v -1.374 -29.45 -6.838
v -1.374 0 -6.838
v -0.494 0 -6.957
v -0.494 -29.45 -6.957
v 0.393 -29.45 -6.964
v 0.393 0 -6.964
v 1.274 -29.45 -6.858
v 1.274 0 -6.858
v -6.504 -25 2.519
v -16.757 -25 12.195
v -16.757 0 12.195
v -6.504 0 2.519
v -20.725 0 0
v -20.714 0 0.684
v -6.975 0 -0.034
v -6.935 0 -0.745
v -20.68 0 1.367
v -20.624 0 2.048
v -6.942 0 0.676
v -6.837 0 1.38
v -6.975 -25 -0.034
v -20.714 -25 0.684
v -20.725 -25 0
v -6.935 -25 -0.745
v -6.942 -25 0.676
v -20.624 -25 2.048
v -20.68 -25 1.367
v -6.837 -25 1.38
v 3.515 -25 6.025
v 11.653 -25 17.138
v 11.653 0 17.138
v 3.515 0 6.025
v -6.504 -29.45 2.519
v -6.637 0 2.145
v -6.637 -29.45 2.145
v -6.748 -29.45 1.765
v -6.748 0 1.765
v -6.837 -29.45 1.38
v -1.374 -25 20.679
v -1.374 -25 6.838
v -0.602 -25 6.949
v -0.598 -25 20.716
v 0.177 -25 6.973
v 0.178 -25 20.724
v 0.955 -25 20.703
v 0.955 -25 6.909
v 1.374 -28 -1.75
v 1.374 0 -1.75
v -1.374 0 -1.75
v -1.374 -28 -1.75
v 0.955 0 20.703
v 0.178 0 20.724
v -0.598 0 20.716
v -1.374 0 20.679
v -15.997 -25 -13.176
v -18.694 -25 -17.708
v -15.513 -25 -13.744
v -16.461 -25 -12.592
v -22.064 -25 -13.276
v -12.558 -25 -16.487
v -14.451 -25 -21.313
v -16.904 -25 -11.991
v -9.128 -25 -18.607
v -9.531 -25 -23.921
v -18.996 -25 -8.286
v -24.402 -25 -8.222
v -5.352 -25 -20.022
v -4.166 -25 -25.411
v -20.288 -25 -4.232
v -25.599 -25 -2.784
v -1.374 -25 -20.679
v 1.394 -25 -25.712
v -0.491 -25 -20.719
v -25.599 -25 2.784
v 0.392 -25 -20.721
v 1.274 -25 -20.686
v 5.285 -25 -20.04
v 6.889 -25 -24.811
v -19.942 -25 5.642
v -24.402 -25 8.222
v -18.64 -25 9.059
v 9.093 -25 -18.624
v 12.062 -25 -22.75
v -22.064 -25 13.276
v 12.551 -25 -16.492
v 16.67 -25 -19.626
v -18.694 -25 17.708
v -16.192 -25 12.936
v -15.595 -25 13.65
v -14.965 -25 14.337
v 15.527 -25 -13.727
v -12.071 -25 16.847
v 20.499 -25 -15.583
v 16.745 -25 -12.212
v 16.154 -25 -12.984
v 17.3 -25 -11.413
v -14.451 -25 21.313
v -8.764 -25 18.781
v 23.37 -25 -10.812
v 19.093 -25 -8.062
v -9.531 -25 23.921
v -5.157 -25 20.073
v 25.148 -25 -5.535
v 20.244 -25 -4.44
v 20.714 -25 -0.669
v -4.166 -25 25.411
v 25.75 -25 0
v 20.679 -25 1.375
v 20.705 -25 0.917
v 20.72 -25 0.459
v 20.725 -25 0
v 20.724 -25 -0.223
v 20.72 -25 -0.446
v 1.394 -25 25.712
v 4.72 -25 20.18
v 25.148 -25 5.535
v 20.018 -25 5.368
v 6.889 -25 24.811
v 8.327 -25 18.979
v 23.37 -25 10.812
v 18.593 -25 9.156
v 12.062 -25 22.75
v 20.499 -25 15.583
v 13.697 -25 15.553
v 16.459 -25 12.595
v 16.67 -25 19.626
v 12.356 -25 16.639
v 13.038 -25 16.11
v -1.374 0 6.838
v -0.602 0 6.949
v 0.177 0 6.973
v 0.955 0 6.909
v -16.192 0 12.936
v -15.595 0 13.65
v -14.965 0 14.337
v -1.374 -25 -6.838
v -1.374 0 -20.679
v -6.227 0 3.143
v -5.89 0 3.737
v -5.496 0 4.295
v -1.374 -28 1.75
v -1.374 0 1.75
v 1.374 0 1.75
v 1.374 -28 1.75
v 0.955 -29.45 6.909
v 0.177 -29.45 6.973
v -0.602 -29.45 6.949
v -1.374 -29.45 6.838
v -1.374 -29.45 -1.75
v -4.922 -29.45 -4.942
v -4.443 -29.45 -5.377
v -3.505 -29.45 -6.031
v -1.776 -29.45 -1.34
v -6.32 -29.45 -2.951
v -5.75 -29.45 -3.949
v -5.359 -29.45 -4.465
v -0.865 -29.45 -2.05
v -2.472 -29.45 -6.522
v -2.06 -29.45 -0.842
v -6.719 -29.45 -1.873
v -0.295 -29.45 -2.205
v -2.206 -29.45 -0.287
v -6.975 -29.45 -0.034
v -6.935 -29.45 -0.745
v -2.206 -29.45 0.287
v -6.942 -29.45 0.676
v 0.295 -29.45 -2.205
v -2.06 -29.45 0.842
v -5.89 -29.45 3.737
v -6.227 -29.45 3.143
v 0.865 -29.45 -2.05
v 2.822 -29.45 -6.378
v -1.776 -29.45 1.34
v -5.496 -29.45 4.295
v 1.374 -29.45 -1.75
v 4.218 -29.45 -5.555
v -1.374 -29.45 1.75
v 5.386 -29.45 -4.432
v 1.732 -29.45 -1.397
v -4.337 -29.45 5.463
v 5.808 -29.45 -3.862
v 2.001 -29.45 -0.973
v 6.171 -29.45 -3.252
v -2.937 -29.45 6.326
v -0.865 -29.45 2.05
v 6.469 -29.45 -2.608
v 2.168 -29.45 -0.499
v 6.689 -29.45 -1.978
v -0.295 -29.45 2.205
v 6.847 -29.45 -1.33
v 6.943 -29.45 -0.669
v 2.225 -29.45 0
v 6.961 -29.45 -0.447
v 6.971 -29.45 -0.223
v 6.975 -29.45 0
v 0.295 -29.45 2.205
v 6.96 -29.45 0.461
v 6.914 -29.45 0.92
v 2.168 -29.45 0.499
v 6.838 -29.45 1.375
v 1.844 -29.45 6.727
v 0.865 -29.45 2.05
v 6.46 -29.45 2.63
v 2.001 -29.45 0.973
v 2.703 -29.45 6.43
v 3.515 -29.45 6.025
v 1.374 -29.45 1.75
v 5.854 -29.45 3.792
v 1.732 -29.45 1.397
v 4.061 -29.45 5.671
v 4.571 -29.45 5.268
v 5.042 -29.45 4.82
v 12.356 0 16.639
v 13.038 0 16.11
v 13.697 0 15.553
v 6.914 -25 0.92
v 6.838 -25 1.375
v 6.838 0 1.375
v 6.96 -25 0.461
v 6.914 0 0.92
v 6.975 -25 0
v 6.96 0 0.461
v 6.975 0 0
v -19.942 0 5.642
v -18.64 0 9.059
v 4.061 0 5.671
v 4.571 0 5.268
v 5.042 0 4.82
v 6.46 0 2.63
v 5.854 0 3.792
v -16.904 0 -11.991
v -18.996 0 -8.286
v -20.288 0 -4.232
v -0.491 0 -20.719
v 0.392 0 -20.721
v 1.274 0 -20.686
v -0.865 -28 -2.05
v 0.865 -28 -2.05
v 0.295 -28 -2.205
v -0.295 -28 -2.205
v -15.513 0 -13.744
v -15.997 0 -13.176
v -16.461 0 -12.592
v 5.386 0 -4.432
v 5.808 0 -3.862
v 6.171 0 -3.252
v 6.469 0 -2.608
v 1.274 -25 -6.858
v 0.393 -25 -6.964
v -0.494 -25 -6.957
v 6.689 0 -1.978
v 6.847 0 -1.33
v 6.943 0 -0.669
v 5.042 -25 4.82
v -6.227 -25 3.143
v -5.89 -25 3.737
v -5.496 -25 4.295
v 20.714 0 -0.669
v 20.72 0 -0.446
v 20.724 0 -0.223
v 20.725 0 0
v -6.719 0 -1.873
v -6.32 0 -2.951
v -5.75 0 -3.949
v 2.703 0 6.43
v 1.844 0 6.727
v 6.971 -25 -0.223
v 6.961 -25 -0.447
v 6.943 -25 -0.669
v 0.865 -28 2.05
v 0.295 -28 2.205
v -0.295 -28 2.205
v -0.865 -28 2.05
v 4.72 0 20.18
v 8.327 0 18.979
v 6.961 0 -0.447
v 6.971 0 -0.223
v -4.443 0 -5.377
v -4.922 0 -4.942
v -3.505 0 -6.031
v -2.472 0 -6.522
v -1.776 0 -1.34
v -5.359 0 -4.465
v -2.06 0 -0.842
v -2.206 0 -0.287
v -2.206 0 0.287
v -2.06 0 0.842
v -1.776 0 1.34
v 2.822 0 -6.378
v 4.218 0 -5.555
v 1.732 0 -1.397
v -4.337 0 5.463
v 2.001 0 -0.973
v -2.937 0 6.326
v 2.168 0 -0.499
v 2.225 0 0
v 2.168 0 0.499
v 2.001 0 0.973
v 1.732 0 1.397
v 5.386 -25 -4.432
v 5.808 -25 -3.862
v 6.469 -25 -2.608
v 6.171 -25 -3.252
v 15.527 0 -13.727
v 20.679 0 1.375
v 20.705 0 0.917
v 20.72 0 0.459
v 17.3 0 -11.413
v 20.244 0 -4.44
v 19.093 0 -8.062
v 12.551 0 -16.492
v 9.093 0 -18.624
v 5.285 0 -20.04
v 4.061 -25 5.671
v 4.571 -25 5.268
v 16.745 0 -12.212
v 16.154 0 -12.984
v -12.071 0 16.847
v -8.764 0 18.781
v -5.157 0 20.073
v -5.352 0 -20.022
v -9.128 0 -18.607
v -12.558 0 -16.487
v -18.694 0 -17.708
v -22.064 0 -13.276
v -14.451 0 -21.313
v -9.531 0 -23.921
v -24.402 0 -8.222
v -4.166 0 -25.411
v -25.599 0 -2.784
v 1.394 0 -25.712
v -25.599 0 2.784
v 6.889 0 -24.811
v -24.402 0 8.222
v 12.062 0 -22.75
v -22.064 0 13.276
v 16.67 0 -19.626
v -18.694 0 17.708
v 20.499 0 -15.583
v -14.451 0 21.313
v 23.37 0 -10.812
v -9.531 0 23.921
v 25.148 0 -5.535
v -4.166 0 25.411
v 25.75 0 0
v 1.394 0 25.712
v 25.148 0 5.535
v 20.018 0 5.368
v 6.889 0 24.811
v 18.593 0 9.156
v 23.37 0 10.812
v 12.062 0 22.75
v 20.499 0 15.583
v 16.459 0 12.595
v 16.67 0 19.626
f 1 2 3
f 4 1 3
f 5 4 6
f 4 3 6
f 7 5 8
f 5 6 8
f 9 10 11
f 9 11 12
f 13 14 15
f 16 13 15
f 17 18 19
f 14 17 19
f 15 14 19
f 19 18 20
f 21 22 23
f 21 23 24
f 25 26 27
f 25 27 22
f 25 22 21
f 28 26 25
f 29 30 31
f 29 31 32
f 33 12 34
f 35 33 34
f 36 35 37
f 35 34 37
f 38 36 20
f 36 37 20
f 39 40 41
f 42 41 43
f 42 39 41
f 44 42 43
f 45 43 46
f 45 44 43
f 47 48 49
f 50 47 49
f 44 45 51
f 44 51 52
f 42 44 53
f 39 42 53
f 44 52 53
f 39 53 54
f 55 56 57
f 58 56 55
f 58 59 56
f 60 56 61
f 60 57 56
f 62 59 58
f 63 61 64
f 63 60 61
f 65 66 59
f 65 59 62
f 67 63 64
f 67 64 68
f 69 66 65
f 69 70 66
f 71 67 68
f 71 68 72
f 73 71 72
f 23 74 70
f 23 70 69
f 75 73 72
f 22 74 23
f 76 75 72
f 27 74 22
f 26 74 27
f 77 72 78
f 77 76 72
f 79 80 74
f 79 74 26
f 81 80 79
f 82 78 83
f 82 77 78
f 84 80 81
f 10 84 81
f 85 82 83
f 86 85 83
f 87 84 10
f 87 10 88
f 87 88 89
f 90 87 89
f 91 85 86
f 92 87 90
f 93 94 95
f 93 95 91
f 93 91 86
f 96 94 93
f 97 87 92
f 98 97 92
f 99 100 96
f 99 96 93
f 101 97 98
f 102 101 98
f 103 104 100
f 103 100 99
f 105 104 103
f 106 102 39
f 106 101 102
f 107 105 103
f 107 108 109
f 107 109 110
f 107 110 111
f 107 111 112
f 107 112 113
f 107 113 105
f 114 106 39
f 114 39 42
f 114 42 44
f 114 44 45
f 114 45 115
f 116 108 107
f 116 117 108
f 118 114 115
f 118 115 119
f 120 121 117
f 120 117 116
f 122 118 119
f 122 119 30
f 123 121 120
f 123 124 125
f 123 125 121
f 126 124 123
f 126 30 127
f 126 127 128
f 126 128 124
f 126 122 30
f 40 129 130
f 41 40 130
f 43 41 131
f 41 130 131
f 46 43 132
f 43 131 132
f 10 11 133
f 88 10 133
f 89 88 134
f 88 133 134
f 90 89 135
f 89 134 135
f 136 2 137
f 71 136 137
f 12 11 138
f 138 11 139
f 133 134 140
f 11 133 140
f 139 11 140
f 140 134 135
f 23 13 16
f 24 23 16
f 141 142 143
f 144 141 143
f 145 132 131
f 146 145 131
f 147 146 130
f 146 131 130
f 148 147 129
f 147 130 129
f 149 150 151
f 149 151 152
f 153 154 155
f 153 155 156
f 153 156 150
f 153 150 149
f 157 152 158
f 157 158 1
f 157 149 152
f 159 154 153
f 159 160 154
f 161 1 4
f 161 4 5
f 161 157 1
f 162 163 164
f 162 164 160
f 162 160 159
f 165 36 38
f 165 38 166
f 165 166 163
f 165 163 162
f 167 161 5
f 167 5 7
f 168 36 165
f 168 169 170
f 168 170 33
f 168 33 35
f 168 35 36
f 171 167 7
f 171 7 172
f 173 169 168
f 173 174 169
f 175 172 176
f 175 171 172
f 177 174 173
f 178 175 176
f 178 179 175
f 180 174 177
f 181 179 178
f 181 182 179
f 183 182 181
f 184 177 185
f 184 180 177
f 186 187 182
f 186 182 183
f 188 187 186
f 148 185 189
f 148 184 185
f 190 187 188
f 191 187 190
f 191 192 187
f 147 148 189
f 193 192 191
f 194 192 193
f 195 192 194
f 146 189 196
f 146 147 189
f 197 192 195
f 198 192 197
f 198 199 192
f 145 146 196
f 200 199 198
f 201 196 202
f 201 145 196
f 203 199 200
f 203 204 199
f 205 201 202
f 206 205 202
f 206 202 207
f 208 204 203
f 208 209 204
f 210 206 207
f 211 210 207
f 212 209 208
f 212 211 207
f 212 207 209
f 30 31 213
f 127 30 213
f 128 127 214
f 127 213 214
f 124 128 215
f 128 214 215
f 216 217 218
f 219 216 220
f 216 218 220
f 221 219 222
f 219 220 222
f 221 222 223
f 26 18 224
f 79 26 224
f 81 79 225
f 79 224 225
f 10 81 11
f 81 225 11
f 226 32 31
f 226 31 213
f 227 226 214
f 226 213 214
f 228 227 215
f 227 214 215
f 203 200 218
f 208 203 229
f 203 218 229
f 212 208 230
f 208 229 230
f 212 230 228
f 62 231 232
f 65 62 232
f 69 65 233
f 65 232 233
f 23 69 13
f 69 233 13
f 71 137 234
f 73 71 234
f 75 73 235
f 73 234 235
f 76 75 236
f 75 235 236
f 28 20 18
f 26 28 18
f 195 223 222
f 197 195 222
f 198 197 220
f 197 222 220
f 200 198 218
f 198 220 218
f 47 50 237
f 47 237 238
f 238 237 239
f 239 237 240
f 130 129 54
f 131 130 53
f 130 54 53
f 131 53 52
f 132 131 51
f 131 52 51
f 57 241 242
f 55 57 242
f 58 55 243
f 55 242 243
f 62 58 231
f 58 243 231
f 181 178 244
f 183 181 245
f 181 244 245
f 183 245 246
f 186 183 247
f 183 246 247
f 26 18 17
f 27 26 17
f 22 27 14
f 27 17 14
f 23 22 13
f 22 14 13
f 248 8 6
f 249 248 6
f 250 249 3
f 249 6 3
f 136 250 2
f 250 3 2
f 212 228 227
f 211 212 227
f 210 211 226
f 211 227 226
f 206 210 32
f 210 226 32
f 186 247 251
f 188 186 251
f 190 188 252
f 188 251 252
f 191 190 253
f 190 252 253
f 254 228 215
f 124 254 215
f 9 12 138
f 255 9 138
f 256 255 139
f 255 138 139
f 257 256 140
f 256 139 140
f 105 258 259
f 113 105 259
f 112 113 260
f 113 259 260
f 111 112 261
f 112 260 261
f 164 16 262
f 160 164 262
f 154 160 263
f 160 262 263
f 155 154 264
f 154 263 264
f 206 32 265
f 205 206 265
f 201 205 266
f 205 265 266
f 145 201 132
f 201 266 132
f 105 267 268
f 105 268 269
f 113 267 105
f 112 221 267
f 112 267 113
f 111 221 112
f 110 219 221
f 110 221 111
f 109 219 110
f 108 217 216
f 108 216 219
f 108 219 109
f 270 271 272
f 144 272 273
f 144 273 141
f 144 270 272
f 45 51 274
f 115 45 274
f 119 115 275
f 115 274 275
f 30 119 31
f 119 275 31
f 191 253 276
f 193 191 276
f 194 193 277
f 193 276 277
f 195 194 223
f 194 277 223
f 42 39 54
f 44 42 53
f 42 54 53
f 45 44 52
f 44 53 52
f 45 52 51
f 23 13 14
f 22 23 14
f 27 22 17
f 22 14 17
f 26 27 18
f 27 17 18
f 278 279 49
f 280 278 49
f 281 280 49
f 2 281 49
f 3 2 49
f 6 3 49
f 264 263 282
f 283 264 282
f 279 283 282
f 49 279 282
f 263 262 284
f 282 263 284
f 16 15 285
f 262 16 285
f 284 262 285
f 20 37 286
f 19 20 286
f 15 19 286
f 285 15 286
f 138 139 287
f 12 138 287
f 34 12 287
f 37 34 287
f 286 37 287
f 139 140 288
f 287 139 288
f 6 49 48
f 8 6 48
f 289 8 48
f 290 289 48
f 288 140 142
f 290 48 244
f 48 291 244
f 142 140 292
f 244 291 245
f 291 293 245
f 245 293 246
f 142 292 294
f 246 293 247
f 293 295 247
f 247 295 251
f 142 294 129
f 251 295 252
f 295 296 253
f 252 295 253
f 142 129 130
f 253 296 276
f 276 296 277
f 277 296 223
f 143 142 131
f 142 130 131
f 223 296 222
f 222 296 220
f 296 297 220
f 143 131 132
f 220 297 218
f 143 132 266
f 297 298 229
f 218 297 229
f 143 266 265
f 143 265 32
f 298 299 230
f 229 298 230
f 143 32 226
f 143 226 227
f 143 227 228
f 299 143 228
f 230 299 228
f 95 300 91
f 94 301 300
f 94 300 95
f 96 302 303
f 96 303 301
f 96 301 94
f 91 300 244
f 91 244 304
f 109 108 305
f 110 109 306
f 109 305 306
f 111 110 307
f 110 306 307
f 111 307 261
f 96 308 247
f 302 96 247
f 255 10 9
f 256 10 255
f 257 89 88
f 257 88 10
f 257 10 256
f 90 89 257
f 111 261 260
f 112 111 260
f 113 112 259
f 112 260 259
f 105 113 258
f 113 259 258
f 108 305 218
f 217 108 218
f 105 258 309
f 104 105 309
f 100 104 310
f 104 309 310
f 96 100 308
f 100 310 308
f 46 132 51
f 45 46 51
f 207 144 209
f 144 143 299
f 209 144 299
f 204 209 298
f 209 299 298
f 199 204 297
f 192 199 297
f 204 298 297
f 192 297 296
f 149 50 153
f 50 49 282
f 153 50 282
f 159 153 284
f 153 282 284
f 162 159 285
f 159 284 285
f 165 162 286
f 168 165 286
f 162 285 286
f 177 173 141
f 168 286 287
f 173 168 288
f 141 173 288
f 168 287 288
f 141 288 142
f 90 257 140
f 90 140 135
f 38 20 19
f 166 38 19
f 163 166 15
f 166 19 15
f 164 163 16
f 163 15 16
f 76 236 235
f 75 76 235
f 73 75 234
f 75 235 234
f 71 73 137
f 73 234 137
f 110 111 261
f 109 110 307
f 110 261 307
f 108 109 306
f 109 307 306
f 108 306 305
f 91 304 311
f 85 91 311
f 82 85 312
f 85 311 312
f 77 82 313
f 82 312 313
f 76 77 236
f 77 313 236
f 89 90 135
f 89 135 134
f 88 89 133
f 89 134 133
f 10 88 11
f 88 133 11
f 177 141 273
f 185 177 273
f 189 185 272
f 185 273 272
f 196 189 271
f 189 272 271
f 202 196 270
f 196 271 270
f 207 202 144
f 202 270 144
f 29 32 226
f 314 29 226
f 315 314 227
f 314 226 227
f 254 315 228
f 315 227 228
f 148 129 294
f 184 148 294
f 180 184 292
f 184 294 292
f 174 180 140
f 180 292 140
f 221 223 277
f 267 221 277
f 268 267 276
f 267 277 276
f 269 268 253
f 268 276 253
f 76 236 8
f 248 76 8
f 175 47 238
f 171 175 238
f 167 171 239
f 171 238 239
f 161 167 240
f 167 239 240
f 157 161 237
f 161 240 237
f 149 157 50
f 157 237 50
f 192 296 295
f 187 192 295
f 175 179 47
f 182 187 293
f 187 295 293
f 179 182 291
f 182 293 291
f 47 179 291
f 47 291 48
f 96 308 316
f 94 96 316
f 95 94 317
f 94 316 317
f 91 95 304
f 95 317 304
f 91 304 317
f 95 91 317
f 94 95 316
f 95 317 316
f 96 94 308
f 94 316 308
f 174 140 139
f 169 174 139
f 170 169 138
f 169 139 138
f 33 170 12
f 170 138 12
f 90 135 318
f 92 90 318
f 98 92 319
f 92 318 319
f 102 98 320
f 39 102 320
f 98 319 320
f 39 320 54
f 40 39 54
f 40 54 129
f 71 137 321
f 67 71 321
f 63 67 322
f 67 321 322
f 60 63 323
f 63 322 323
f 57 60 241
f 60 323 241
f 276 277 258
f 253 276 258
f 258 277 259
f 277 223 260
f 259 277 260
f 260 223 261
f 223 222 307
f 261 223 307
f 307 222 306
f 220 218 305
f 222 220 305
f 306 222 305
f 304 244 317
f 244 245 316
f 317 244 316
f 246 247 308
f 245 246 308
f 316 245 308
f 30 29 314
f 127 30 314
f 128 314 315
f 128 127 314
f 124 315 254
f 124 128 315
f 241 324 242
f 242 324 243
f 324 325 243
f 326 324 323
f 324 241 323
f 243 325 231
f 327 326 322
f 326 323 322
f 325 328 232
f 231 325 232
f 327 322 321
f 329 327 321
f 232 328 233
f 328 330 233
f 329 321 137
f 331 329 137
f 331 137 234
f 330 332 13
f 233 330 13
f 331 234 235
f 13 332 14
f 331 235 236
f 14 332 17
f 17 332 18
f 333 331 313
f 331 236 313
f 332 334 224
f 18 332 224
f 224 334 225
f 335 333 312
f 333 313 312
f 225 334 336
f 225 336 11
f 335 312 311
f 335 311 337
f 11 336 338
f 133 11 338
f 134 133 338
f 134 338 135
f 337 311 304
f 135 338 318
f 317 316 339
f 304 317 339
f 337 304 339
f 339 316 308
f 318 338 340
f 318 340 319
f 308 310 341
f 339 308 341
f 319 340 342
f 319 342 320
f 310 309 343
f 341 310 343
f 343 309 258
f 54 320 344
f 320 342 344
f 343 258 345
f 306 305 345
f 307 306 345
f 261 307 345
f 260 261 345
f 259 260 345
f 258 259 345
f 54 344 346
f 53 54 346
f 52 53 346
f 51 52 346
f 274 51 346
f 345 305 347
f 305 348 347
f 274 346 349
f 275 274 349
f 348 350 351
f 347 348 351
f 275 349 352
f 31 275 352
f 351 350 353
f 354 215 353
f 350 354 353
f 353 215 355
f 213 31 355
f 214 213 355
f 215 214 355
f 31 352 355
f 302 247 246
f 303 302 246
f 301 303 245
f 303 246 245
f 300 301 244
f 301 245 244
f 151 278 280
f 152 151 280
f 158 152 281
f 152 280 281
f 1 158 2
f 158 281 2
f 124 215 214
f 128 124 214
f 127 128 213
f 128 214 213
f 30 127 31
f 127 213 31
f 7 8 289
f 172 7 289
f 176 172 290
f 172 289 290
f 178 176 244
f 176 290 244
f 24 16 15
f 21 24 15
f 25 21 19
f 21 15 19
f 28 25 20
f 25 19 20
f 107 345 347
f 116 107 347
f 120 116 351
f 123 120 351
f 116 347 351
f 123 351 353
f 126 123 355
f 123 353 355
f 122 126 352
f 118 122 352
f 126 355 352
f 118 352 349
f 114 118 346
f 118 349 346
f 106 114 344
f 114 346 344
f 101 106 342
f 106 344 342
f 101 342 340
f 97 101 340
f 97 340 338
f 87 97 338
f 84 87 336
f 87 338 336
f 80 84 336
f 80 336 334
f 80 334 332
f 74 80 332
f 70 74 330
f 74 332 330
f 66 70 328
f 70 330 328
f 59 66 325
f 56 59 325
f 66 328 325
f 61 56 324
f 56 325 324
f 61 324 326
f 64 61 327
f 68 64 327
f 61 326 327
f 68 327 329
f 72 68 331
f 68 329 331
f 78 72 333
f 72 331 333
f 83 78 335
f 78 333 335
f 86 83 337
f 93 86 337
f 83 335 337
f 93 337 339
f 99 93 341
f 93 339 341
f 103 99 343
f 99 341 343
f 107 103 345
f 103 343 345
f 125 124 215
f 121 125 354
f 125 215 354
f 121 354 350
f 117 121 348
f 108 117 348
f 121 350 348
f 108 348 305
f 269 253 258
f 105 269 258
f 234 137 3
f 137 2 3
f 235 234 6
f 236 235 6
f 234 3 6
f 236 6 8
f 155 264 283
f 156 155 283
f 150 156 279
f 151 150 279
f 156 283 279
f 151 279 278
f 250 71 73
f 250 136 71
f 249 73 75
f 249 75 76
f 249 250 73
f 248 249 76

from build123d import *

# Parameters (mm, degrees)
F0_R     = 25.75
F1_DEPTH = 25
F2_DEPTH = 29.45
F3_DEPTH = 28
F4_DEPTH = 25


with BuildPart() as f1:
    # F0 (on Front) → F1 (new body)
    with BuildSketch(Plane.XZ):
        Circle(F0_R)
        with BuildLine():
            ThreePointArc((20.679312, 1.375379), (20.713575, 0.688069), (20.725, 0))
            ThreePointArc((20.725, 0), (20.722297, -0.334688), (20.71419, -0.669289))
            ThreePointArc((20.71419, -0.669289), (19.751408, -6.277539), (17.299683, -11.412563))
            ThreePointArc((17.299683, -11.412563), (16.454074, -12.601154), (15.526954, -13.727321))
            ThreePointArc((15.526954, -13.727321), (9.092691, -18.623871), (1.274476, -20.685776))
            ThreePointArc((1.274476, -20.685776), (-0.049745, -20.72494), (-1.373763, -20.67942))
            ThreePointArc((-1.373763, -20.67942), (-9.127585, -18.606795), (-15.51251, -13.74364))
            ThreePointArc((-15.51251, -13.74364), (-16.231848, -12.886145), (-16.903845, -11.991066))
            ThreePointArc((-16.903845, -11.991066), (-19.746617, -6.292593), (-20.725, 0))
            ThreePointArc((-20.725, 0), (-20.699616, 1.025436), (-20.623527, 2.048359))
            ThreePointArc((-20.623527, 2.048359), (-19.366726, 7.3794), (-16.757287, 12.195038))
            ThreePointArc((-16.757287, 12.195038), (-15.897486, 13.296449), (-14.965425, 14.337422))
            ThreePointArc((-14.965425, 14.337422), (-8.763567, 18.780988), (-1.374091, 20.679398))
            ThreePointArc((-1.374091, 20.679398), (-0.20997, 20.723936), (0.954814, 20.702994))
            ThreePointArc((0.954814, 20.702994), (6.551124, 19.66236), (11.653244, 17.138481))
            ThreePointArc((11.653244, 17.138481), (12.700102, 16.377822), (13.697447, 15.553313))
            ThreePointArc((13.697447, 15.553313), (18.592844, 9.155969), (20.679312, 1.375379))
        make_face(mode=Mode.SUBTRACT)
    extrude(amount=F1_DEPTH)


with BuildPart() as f2:
    # F0 (on Front) → F2 (new body)
    with BuildSketch(Plane.XZ):
        with BuildLine():
            ThreePointArc((6.975, 0), (6.940679, 0.69109), (6.838052, 1.375379))
            ThreePointArc((6.838052, 1.375379), (6.184484, 3.225335), (5.041566, 4.820086))
            ThreePointArc((5.041566, 4.820086), (4.320488, 5.475766), (3.515055, 6.024534))
            ThreePointArc((3.515055, 6.024534), (2.2783, 6.592418), (0.954814, 6.909338))
            ThreePointArc((0.954814, 6.909338), (-0.212625, 6.971758), (-1.374091, 6.838311))
            ThreePointArc((-1.374091, 6.838311), (-3.662813, 5.935859), (-5.495842, 4.294921))
            ThreePointArc((-5.495842, 4.294921), (-6.065514, 3.443859), (-6.504423, 2.518552))
            ThreePointArc((-6.504423, 2.518552), (-6.695044, 1.956274), (-6.837157, 1.379821))
            ThreePointArc((-6.837157, 1.379821), (-6.967596, 0.321289), (-6.935126, -0.744754))
            ThreePointArc((-6.935126, -0.744754), (-6.54156, -2.420457), (-5.749608, -3.948751))
            ThreePointArc((-5.749608, -3.948751), (-5.145982, -4.708449), (-4.44277, -5.377027))
            ThreePointArc((-4.44277, -5.377027), (-2.99865, -6.297517), (-1.373763, -6.838377))
            ThreePointArc((-1.373763, -6.838377), (-0.050563, -6.974817), (1.274476, -6.857575))
            ThreePointArc((1.274476, -6.857575), (3.544137, -6.007472), (5.385882, -4.432031))
            ThreePointArc((5.385882, -4.432031), (5.997274, -3.561366), (6.469139, -2.607846))
            ThreePointArc((6.469139, -2.607846), (6.775664, -1.655595), (6.942815, -0.669289))
            ThreePointArc((6.942815, -0.669289), (6.966949, -0.335031), (6.975, 0))
        make_face()
        with BuildLine():
            ThreePointArc((1.374091, 1.75), (2.000997, 0.972953), (2.225, 0))
            ThreePointArc((2.225, 0), (2.000997, -0.972953), (1.374091, -1.75))
            ThreePointArc((1.374091, -1.75), (0, -2.225), (-1.374091, -1.75))
            ThreePointArc((-1.374091, -1.75), (-2.225, 0), (-1.374091, 1.75))
            ThreePointArc((-1.374091, 1.75), (0, 2.225), (1.374091, 1.75))
        make_face(mode=Mode.SUBTRACT)
    extrude(amount=F2_DEPTH)

    # F0 (on Front) → F3 (join)
    with BuildSketch(Plane.XZ):
        with BuildLine():
            Line((-1.374091, 1.75), (1.374091, 1.75))
            ThreePointArc((1.374091, 1.75), (0, 2.225), (-1.374091, 1.75))
        make_face()
        with BuildLine():
            ThreePointArc((-1.374091, -1.75), (0, -2.225), (1.374091, -1.75))
            Line((1.374091, -1.75), (-1.374091, -1.75))
        make_face()
    extrude(amount=F3_DEPTH)


with BuildPart() as f4:
    # F0 (on Front) → F4 (new body)
    with BuildSketch(Plane.XZ):
        with BuildLine():
            Line((-5.495842, 4.294921), (-14.965425, 14.337422))
            ThreePointArc((-14.965425, 14.337422), (-15.897486, 13.296449), (-16.757287, 12.195038))
            Line((-16.757287, 12.195038), (-6.504423, 2.518552))
            ThreePointArc((-6.504423, 2.518552), (-6.065514, 3.443859), (-5.495842, 4.294921))
        make_face()
        with BuildLine():
            Line((0.954814, 6.909338), (0.954814, 20.702994))
            ThreePointArc((0.954814, 20.702994), (-0.20997, 20.723936), (-1.374091, 20.679398))
            Line((-1.374091, 20.679398), (-1.374091, 6.838311))
            ThreePointArc((-1.374091, 6.838311), (-0.212625, 6.971758), (0.954814, 6.909338))
        make_face()
        with BuildLine():
            Line((5.041566, 4.820086), (13.697447, 15.553313))
            ThreePointArc((13.697447, 15.553313), (12.700102, 16.377822), (11.653244, 17.138481))
            Line((11.653244, 17.138481), (3.515055, 6.024534))
            ThreePointArc((3.515055, 6.024534), (4.320488, 5.475766), (5.041566, 4.820086))
        make_face()
        with BuildLine():
            ThreePointArc((20.71419, -0.669289), (20.722297, -0.334688), (20.725, 0))
            ThreePointArc((20.725, 0), (20.713575, 0.688069), (20.679312, 1.375379))
            Line((20.679312, 1.375379), (6.838052, 1.375379))
            ThreePointArc((6.838052, 1.375379), (6.940679, 0.69109), (6.975, 0))
            ThreePointArc((6.975, 0), (6.966949, -0.335031), (6.942815, -0.669289))
            Line((6.942815, -0.669289), (20.71419, -0.669289))
        make_face()
        with BuildLine():
            ThreePointArc((15.526954, -13.727321), (16.454074, -12.601154), (17.299683, -11.412563))
            Line((17.299683, -11.412563), (6.469139, -2.607846))
            ThreePointArc((6.469139, -2.607846), (5.997274, -3.561366), (5.385882, -4.432031))
            Line((5.385882, -4.432031), (15.526954, -13.727321))
        make_face()
        with BuildLine():
            Line((-6.837157, 1.379821), (-20.623527, 2.048359))
            ThreePointArc((-20.623527, 2.048359), (-20.699616, 1.025436), (-20.725, 0))
            Line((-20.725, 0), (-6.935126, -0.744754))
            ThreePointArc((-6.935126, -0.744754), (-6.967596, 0.321289), (-6.837157, 1.379821))
        make_face()
        with BuildLine():
            ThreePointArc((-1.373763, -20.67942), (-0.049745, -20.72494), (1.274476, -20.685776))
            Line((1.274476, -20.685776), (1.274476, -6.857575))
            ThreePointArc((1.274476, -6.857575), (-0.050563, -6.974817), (-1.373763, -6.838377))
            Line((-1.373763, -6.838377), (-1.373763, -20.67942))
        make_face()
    extrude(amount=F4_DEPTH)


solid = Compound([f1.part, f2.part, f4.part])
